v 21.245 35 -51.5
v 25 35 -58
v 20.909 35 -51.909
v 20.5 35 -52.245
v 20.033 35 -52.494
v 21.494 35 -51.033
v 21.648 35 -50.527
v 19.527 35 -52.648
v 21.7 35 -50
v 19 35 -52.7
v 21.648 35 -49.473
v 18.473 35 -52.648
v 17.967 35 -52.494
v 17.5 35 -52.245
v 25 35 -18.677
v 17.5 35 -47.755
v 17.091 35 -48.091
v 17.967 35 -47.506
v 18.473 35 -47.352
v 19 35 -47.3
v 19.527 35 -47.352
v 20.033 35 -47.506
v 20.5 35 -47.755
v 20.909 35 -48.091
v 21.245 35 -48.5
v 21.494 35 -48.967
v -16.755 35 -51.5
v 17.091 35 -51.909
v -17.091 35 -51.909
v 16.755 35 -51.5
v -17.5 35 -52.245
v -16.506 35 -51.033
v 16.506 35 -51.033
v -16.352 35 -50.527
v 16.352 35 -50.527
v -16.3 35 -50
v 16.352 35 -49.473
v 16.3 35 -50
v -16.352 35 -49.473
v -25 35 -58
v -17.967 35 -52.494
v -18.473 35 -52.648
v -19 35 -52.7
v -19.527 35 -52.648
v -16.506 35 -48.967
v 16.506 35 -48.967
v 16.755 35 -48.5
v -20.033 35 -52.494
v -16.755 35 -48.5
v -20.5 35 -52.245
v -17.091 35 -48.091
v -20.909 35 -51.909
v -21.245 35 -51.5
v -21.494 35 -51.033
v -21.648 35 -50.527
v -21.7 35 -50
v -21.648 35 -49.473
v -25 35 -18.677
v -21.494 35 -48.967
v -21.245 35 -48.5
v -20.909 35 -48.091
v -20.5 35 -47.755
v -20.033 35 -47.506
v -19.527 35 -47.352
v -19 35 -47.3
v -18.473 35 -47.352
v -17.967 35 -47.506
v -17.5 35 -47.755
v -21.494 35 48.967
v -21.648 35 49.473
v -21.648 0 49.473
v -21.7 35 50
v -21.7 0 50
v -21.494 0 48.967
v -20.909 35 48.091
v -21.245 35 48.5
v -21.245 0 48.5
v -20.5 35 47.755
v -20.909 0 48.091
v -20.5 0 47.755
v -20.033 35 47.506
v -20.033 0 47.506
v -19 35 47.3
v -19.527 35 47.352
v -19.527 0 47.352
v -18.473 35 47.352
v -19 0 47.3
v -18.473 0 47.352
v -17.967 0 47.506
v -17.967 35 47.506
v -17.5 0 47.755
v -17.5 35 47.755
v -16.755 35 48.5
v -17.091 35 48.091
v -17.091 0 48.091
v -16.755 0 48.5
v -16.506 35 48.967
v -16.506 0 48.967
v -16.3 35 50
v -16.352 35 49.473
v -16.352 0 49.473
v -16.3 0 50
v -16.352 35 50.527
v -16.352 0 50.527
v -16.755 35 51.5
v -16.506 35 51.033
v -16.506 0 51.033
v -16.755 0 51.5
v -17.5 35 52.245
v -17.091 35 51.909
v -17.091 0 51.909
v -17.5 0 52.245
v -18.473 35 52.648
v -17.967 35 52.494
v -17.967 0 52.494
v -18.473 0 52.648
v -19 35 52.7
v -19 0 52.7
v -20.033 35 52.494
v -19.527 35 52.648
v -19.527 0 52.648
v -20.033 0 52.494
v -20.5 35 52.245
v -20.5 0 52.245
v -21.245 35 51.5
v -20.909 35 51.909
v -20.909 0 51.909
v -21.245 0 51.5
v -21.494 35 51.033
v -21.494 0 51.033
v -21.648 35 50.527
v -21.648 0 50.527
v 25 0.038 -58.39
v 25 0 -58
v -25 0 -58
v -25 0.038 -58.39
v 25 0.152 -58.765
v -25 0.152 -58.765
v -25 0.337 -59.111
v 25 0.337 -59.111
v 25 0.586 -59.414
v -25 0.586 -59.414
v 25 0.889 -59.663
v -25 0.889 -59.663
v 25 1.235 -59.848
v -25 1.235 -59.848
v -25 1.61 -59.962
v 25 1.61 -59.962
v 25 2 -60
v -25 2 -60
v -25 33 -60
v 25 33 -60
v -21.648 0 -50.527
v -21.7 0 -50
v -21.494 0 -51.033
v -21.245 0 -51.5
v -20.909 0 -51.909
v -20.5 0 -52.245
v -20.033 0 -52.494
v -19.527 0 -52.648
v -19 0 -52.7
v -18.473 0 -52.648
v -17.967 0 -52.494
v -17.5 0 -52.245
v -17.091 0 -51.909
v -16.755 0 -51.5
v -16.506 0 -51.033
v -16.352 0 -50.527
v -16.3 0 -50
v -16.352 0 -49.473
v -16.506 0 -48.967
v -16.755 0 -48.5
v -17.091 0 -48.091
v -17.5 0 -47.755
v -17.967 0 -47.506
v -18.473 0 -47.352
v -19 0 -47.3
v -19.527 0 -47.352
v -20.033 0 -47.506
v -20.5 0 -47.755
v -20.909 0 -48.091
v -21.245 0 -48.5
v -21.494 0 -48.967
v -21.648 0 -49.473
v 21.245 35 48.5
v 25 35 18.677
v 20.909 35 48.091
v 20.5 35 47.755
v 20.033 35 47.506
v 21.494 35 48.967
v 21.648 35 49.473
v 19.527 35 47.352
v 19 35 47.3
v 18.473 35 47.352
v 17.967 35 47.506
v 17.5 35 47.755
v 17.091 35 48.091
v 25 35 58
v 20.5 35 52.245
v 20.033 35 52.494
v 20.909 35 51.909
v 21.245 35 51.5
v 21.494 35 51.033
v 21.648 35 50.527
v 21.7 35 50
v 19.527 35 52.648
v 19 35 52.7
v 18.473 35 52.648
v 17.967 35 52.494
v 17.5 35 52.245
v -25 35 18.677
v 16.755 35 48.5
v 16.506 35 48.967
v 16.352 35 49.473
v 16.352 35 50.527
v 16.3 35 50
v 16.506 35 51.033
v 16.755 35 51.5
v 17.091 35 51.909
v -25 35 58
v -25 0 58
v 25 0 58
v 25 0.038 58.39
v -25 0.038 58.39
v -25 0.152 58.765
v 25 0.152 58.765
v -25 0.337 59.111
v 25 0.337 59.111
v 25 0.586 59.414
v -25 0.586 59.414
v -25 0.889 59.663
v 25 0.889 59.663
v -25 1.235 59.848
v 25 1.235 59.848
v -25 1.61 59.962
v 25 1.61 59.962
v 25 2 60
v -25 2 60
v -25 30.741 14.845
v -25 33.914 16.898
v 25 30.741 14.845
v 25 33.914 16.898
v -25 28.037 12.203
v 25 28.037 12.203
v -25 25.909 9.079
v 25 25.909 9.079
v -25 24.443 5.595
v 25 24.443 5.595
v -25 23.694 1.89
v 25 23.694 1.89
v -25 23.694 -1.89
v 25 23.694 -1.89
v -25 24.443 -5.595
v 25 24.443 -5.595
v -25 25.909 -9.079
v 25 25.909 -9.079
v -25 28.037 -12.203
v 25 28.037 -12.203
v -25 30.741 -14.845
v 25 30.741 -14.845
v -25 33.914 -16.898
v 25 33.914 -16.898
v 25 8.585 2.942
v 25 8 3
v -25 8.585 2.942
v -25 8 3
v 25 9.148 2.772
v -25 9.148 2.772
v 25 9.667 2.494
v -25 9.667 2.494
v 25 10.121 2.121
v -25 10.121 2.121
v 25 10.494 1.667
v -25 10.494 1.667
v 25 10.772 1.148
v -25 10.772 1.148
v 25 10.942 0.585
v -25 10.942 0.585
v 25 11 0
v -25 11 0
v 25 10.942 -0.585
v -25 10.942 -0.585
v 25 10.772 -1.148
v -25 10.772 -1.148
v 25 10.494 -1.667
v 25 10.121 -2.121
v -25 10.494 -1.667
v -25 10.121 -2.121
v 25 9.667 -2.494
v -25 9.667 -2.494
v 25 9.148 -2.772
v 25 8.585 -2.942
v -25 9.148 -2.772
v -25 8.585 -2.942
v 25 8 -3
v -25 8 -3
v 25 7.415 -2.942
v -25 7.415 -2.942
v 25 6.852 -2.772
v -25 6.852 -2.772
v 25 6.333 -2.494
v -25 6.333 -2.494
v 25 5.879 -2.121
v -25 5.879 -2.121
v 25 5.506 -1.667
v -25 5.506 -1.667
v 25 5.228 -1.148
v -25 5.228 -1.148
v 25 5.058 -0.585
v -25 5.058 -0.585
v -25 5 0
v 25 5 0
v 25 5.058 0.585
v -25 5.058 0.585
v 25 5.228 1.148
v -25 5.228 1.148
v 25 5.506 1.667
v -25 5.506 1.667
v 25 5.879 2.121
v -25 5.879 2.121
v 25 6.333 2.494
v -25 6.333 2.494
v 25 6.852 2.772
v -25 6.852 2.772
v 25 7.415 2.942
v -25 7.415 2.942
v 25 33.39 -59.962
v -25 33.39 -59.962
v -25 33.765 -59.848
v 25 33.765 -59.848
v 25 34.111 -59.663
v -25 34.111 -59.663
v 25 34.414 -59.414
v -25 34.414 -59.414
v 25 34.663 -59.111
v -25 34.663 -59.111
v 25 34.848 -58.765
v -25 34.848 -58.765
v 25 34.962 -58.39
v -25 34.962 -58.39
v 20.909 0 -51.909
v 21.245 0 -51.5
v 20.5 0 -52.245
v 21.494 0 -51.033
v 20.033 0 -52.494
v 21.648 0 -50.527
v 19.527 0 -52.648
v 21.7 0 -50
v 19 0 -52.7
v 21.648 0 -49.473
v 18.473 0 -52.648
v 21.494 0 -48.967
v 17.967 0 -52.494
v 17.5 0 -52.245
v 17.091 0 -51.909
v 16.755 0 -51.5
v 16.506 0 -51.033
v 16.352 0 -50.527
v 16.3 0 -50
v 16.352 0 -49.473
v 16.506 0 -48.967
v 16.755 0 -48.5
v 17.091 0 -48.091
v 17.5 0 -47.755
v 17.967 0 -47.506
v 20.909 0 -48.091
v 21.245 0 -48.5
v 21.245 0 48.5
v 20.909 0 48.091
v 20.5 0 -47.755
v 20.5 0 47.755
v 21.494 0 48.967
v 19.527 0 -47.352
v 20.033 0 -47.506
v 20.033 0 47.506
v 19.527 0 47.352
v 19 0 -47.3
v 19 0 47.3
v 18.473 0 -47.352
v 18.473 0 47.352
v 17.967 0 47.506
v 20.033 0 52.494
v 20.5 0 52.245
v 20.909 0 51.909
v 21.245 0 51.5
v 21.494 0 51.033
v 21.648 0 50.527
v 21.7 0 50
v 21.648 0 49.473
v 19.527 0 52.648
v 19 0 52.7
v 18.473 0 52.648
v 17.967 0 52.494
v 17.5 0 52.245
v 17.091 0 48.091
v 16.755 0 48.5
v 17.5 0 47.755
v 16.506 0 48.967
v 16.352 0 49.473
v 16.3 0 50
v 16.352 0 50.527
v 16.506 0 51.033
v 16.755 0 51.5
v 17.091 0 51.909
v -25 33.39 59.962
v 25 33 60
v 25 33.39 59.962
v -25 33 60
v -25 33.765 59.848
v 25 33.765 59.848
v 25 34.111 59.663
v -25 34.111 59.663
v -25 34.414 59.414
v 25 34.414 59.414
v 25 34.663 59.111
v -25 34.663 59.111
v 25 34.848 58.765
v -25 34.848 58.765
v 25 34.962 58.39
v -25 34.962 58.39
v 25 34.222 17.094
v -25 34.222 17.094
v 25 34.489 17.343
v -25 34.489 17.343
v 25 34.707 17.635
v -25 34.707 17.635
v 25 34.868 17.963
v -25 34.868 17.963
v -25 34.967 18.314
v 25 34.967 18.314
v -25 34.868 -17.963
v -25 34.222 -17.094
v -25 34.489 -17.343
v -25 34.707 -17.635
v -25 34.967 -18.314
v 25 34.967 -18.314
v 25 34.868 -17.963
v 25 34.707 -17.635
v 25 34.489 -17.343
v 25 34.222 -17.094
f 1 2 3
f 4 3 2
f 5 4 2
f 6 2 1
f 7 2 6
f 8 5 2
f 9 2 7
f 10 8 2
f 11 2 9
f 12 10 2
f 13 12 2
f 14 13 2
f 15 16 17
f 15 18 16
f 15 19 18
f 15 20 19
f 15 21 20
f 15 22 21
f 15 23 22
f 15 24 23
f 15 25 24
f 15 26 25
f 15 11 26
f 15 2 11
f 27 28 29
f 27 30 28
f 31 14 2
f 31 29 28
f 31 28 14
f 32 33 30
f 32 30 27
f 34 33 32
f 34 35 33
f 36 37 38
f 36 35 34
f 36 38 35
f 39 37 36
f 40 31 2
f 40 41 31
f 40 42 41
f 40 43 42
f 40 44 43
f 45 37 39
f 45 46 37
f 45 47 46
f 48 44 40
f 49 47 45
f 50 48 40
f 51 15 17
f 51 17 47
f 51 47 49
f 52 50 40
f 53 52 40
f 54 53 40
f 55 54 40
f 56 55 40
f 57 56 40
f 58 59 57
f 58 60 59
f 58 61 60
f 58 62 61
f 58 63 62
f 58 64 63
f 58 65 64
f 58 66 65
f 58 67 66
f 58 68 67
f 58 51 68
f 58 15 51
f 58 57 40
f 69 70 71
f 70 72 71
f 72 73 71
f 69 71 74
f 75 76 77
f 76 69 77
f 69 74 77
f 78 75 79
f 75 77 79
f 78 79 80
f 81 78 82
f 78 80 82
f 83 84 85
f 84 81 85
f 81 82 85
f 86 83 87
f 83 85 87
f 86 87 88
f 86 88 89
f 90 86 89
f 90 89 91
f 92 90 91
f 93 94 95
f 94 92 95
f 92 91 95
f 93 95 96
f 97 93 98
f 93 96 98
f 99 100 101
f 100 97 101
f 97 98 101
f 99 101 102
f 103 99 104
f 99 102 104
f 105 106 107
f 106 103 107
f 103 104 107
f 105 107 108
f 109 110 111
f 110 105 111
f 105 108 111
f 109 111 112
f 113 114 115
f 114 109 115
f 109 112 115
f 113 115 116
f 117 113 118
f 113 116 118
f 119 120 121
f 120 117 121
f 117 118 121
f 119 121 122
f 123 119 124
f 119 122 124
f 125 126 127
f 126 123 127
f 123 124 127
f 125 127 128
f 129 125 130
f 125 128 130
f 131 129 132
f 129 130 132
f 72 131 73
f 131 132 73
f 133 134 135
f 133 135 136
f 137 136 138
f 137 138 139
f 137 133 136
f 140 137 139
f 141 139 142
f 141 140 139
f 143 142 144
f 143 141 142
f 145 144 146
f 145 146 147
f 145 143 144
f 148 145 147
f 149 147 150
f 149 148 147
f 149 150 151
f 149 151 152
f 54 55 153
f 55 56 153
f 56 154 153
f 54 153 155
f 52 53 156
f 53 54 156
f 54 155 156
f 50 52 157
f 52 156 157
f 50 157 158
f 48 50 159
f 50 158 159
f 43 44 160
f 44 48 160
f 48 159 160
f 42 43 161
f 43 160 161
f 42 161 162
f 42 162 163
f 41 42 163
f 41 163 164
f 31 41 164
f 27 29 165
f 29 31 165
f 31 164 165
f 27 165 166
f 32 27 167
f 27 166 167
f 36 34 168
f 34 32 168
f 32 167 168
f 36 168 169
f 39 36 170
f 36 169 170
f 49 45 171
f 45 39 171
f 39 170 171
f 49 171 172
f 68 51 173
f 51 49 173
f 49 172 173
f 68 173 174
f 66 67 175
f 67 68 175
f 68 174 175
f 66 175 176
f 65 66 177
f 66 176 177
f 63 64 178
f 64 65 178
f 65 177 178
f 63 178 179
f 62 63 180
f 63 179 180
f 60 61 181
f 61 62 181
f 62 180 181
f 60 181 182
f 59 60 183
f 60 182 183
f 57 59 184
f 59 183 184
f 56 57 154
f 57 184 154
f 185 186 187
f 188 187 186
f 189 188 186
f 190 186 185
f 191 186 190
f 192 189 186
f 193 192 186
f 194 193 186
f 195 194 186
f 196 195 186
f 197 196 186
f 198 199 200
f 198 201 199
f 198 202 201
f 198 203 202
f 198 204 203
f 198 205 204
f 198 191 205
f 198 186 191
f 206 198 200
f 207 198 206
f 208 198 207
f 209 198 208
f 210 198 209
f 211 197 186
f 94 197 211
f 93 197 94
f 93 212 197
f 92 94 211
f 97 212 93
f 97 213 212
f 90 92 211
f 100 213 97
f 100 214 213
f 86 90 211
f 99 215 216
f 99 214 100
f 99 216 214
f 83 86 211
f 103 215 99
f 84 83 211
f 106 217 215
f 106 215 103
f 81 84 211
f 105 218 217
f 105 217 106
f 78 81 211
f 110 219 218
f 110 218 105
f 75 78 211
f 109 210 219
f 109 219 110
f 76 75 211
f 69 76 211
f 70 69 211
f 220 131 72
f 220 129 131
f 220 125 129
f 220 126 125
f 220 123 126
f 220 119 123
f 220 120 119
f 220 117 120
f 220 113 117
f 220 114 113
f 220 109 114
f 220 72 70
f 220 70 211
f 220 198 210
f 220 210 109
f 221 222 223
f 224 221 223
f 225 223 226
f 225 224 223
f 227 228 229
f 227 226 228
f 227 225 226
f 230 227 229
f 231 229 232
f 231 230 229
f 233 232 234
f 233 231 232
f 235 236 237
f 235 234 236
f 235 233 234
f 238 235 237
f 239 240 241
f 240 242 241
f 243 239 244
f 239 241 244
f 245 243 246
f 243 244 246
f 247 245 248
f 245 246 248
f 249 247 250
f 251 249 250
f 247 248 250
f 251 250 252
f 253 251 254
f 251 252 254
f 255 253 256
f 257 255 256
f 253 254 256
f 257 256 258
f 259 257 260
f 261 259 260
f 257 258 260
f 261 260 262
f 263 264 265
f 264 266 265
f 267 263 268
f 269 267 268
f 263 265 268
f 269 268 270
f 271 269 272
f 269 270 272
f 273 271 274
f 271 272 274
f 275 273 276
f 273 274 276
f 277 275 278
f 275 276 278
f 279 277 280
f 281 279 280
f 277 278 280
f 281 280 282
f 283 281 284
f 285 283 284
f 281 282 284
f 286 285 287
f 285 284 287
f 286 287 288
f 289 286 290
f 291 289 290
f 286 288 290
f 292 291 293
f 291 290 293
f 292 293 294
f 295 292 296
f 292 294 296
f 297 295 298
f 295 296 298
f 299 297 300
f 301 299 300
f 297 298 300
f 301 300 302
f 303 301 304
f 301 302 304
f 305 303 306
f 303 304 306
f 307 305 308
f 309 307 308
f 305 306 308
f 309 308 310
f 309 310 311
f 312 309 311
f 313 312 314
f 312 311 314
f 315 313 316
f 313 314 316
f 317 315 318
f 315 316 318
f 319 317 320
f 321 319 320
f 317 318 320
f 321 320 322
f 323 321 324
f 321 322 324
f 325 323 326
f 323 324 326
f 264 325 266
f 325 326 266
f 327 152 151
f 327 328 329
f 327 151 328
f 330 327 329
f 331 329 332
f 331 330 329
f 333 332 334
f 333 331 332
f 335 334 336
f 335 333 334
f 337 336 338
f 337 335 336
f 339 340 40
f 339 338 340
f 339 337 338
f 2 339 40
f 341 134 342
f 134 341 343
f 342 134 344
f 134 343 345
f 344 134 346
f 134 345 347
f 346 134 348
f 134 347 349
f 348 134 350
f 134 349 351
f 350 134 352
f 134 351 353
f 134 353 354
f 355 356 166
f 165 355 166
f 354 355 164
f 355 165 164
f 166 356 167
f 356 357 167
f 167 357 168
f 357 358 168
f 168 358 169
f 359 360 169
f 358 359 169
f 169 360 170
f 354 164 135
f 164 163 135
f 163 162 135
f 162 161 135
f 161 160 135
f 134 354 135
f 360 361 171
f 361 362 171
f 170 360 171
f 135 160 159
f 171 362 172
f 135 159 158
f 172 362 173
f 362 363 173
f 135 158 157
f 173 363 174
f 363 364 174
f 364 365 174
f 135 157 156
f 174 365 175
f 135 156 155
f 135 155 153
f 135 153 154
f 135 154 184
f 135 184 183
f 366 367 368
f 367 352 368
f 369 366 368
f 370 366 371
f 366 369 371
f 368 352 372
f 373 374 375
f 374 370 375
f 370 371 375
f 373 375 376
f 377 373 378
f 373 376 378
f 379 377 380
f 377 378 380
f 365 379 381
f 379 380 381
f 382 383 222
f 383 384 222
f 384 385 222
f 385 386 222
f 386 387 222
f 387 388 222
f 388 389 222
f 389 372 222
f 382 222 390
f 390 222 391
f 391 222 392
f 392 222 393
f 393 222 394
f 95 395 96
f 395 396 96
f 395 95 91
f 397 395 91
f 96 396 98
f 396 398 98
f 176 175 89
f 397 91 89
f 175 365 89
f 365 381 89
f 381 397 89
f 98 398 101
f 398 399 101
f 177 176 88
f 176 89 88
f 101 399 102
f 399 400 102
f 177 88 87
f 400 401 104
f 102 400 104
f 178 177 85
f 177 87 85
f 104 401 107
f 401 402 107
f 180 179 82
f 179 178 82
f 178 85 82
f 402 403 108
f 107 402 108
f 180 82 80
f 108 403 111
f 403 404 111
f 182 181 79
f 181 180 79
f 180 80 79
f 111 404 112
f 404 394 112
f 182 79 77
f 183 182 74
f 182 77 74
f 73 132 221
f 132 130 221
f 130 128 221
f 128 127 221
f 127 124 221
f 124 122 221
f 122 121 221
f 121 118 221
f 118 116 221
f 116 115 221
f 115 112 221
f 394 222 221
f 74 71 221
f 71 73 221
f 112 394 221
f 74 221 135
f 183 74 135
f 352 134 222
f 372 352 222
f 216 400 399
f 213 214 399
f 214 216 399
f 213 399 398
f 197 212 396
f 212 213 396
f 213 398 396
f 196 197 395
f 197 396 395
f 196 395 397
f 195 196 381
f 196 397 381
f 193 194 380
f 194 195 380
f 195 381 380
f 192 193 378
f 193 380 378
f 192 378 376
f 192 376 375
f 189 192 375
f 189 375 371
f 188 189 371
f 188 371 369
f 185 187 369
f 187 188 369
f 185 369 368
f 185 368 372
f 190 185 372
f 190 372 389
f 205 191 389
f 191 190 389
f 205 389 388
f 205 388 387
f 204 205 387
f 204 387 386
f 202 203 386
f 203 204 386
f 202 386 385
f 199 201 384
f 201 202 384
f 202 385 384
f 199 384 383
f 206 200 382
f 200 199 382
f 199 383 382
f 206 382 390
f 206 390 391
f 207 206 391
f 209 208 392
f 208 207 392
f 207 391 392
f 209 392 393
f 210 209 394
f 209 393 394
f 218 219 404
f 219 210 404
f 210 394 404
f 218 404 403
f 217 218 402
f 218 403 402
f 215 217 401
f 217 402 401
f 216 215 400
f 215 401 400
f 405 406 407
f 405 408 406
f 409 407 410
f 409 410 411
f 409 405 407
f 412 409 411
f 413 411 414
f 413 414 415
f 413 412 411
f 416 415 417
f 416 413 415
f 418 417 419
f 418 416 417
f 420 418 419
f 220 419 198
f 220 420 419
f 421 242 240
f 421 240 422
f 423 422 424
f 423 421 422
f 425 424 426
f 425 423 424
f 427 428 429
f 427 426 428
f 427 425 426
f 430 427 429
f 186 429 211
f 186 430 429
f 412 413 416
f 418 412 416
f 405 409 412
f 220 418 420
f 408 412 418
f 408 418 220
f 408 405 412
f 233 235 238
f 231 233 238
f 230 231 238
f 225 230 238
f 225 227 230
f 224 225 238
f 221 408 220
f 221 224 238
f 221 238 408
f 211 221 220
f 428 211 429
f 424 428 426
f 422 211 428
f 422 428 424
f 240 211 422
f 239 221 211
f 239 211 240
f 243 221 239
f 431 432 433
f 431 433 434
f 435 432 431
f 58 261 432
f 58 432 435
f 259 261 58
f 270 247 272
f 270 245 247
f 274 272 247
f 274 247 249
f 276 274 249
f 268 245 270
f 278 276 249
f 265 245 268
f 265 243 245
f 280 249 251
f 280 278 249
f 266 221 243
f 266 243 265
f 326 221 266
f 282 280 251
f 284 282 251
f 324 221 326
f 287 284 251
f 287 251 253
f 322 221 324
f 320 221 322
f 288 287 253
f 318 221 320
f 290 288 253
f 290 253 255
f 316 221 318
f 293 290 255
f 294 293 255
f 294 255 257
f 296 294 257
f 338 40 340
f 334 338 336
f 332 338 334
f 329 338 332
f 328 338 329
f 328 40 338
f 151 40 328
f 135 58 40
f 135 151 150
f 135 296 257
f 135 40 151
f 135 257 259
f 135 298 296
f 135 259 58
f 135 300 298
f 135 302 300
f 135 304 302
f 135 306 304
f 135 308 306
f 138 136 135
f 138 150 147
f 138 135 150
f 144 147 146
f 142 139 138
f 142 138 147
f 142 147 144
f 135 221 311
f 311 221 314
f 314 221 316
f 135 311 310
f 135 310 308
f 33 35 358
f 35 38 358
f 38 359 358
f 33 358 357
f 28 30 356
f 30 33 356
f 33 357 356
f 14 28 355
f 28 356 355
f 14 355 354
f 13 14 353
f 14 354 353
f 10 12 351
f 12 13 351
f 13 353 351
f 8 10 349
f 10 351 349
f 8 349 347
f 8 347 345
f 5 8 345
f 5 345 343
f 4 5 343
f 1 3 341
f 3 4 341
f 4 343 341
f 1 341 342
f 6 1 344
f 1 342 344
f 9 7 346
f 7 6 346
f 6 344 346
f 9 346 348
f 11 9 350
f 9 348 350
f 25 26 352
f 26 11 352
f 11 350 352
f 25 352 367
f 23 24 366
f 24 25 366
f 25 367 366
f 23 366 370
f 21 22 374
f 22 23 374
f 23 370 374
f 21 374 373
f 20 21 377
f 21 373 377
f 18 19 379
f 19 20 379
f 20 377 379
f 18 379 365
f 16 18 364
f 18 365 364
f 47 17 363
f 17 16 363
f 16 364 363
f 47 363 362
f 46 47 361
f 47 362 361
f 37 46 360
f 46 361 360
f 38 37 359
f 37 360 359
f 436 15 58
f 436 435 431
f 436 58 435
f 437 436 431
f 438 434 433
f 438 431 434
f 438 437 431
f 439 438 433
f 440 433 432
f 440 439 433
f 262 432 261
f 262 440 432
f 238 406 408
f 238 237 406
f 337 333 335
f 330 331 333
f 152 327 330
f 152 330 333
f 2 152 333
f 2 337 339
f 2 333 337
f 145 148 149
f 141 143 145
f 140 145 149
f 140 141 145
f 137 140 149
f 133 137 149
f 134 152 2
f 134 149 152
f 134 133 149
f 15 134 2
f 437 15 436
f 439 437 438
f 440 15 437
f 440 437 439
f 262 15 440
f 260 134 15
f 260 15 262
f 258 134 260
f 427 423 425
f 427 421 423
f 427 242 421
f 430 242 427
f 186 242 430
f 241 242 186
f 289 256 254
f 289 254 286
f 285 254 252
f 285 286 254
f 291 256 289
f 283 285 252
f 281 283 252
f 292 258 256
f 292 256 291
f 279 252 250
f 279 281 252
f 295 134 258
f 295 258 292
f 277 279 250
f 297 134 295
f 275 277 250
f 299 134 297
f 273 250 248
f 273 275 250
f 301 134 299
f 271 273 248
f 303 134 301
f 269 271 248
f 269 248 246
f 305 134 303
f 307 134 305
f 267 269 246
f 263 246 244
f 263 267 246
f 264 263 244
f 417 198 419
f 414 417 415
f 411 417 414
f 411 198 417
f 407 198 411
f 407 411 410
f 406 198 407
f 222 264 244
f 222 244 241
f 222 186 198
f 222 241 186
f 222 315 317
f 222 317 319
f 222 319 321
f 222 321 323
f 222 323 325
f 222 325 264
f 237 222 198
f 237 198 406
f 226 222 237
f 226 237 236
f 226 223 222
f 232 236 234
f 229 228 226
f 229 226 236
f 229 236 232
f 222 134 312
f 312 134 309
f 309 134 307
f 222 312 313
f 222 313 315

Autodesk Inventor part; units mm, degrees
ref_plane "YZ Plane" through (0, 0, 0) normal (1, 0, 0) x (0, 1, 0)
ref_plane "XZ Plane" through (0, 0, 0) normal (0, 1, 0) x (-1, 0, 0)
ref_plane "XY Plane" through (0, 0, 0) normal (0, 0, 1) x (1, 0, 0)
sketch "Boceto1" plane through (0, 0, 0) normal (0, 1, 0) x (-1, 0, 0)
  line L0 (-25, 60) -> (25, 60)
  line L1 (25, 60) -> (25, -60)
  line L2 (25, -60) -> (-25, -60)
  line L3 (-25, -60) -> (-25, 60)
  line L4 (-25, 60) -> (25, -60) construction
  line L5 (25, 60) -> (-25, -60) construction
  circle A0 centre (19, 50) radius 2.7
  circle A1 centre (-19, 50) radius 2.7
  circle A2 centre (19, -50) radius 2.7
  circle A3 centre (-19, -50) radius 2.7
  point P0 (0, 0)
  dimension "d0" = 120
  dimension "d1" = 50
  dimension "d2" = 5.4
  dimension "d3" = 6
  dimension "d4" = 6
  dimension "d5" = 10
  dimension "d6" = 10
  dimension "d7" = 10
extrude "Extrusión1" add sketch "Boceto1" along normal blind 35
sketch "Boceto2" plane through (-25, 0, -60) normal (-1, 0, 0) x (0, 0, 1)
  circle A0 centre (60, 8) radius 3
  line L0 (0, 0) -> (120, 0) projected
  line L1 (120, 0) -> (0, 0) projected
  point P0 (60, 0)
  point P1 (60, 0)
  dimension "d10" = 6
  dimension "d11" = 8
extrude "Extrusión2" cut sketch "Boceto2" against normal through all
sketch "Boceto3" plane through (25, 0, 60) normal (1, 0, 0) x (0, 0, -1)
  circle A0 centre (60, 42.6) radius 12.5
  line L0 (0, 35) -> (120, 35) projected
  line L1 (0, 0) -> (120, 0) projected
  point P0 (60, 0)
  point P1 (60, 0)
  dimension "d14" = 25
  dimension "d15" = 7.6
extrude "Extrusión3" cut sketch "Boceto3" against normal through all
sketch "Boceto4" plane through (25, 0, 60) normal (1, 0, 0) x (0, 0, -1)
  circle A0 centre (60, 42.6) radius 18 projected
  point P0 (60, 0)
extrude "Extrusión4" cut sketch "Boceto4" against normal blind 104.5
sketch "Boceto5" plane through (25, 0, 60) normal (1, 0, 0) x (0, 0, -1)
  arc A0 (43.6831, 35) -> (76.3169, 35) centre (60, 42.6) ccw projected
  circle A1 centre (60, 42.6) radius 19
  point P0 (60, 0)
  dimension "d20" = 1
extrude "Extrusión5" cut sketch "Boceto5" against normal through all
fillet "Empalme1" radius 2 6 edges at (0, 0, 60) (0, 35, 60) (0, 35, -60) (0, 0, -60) (0, 35, -17.4138) (0, 35, 17.4138)
properties part number "LowerSupport"
